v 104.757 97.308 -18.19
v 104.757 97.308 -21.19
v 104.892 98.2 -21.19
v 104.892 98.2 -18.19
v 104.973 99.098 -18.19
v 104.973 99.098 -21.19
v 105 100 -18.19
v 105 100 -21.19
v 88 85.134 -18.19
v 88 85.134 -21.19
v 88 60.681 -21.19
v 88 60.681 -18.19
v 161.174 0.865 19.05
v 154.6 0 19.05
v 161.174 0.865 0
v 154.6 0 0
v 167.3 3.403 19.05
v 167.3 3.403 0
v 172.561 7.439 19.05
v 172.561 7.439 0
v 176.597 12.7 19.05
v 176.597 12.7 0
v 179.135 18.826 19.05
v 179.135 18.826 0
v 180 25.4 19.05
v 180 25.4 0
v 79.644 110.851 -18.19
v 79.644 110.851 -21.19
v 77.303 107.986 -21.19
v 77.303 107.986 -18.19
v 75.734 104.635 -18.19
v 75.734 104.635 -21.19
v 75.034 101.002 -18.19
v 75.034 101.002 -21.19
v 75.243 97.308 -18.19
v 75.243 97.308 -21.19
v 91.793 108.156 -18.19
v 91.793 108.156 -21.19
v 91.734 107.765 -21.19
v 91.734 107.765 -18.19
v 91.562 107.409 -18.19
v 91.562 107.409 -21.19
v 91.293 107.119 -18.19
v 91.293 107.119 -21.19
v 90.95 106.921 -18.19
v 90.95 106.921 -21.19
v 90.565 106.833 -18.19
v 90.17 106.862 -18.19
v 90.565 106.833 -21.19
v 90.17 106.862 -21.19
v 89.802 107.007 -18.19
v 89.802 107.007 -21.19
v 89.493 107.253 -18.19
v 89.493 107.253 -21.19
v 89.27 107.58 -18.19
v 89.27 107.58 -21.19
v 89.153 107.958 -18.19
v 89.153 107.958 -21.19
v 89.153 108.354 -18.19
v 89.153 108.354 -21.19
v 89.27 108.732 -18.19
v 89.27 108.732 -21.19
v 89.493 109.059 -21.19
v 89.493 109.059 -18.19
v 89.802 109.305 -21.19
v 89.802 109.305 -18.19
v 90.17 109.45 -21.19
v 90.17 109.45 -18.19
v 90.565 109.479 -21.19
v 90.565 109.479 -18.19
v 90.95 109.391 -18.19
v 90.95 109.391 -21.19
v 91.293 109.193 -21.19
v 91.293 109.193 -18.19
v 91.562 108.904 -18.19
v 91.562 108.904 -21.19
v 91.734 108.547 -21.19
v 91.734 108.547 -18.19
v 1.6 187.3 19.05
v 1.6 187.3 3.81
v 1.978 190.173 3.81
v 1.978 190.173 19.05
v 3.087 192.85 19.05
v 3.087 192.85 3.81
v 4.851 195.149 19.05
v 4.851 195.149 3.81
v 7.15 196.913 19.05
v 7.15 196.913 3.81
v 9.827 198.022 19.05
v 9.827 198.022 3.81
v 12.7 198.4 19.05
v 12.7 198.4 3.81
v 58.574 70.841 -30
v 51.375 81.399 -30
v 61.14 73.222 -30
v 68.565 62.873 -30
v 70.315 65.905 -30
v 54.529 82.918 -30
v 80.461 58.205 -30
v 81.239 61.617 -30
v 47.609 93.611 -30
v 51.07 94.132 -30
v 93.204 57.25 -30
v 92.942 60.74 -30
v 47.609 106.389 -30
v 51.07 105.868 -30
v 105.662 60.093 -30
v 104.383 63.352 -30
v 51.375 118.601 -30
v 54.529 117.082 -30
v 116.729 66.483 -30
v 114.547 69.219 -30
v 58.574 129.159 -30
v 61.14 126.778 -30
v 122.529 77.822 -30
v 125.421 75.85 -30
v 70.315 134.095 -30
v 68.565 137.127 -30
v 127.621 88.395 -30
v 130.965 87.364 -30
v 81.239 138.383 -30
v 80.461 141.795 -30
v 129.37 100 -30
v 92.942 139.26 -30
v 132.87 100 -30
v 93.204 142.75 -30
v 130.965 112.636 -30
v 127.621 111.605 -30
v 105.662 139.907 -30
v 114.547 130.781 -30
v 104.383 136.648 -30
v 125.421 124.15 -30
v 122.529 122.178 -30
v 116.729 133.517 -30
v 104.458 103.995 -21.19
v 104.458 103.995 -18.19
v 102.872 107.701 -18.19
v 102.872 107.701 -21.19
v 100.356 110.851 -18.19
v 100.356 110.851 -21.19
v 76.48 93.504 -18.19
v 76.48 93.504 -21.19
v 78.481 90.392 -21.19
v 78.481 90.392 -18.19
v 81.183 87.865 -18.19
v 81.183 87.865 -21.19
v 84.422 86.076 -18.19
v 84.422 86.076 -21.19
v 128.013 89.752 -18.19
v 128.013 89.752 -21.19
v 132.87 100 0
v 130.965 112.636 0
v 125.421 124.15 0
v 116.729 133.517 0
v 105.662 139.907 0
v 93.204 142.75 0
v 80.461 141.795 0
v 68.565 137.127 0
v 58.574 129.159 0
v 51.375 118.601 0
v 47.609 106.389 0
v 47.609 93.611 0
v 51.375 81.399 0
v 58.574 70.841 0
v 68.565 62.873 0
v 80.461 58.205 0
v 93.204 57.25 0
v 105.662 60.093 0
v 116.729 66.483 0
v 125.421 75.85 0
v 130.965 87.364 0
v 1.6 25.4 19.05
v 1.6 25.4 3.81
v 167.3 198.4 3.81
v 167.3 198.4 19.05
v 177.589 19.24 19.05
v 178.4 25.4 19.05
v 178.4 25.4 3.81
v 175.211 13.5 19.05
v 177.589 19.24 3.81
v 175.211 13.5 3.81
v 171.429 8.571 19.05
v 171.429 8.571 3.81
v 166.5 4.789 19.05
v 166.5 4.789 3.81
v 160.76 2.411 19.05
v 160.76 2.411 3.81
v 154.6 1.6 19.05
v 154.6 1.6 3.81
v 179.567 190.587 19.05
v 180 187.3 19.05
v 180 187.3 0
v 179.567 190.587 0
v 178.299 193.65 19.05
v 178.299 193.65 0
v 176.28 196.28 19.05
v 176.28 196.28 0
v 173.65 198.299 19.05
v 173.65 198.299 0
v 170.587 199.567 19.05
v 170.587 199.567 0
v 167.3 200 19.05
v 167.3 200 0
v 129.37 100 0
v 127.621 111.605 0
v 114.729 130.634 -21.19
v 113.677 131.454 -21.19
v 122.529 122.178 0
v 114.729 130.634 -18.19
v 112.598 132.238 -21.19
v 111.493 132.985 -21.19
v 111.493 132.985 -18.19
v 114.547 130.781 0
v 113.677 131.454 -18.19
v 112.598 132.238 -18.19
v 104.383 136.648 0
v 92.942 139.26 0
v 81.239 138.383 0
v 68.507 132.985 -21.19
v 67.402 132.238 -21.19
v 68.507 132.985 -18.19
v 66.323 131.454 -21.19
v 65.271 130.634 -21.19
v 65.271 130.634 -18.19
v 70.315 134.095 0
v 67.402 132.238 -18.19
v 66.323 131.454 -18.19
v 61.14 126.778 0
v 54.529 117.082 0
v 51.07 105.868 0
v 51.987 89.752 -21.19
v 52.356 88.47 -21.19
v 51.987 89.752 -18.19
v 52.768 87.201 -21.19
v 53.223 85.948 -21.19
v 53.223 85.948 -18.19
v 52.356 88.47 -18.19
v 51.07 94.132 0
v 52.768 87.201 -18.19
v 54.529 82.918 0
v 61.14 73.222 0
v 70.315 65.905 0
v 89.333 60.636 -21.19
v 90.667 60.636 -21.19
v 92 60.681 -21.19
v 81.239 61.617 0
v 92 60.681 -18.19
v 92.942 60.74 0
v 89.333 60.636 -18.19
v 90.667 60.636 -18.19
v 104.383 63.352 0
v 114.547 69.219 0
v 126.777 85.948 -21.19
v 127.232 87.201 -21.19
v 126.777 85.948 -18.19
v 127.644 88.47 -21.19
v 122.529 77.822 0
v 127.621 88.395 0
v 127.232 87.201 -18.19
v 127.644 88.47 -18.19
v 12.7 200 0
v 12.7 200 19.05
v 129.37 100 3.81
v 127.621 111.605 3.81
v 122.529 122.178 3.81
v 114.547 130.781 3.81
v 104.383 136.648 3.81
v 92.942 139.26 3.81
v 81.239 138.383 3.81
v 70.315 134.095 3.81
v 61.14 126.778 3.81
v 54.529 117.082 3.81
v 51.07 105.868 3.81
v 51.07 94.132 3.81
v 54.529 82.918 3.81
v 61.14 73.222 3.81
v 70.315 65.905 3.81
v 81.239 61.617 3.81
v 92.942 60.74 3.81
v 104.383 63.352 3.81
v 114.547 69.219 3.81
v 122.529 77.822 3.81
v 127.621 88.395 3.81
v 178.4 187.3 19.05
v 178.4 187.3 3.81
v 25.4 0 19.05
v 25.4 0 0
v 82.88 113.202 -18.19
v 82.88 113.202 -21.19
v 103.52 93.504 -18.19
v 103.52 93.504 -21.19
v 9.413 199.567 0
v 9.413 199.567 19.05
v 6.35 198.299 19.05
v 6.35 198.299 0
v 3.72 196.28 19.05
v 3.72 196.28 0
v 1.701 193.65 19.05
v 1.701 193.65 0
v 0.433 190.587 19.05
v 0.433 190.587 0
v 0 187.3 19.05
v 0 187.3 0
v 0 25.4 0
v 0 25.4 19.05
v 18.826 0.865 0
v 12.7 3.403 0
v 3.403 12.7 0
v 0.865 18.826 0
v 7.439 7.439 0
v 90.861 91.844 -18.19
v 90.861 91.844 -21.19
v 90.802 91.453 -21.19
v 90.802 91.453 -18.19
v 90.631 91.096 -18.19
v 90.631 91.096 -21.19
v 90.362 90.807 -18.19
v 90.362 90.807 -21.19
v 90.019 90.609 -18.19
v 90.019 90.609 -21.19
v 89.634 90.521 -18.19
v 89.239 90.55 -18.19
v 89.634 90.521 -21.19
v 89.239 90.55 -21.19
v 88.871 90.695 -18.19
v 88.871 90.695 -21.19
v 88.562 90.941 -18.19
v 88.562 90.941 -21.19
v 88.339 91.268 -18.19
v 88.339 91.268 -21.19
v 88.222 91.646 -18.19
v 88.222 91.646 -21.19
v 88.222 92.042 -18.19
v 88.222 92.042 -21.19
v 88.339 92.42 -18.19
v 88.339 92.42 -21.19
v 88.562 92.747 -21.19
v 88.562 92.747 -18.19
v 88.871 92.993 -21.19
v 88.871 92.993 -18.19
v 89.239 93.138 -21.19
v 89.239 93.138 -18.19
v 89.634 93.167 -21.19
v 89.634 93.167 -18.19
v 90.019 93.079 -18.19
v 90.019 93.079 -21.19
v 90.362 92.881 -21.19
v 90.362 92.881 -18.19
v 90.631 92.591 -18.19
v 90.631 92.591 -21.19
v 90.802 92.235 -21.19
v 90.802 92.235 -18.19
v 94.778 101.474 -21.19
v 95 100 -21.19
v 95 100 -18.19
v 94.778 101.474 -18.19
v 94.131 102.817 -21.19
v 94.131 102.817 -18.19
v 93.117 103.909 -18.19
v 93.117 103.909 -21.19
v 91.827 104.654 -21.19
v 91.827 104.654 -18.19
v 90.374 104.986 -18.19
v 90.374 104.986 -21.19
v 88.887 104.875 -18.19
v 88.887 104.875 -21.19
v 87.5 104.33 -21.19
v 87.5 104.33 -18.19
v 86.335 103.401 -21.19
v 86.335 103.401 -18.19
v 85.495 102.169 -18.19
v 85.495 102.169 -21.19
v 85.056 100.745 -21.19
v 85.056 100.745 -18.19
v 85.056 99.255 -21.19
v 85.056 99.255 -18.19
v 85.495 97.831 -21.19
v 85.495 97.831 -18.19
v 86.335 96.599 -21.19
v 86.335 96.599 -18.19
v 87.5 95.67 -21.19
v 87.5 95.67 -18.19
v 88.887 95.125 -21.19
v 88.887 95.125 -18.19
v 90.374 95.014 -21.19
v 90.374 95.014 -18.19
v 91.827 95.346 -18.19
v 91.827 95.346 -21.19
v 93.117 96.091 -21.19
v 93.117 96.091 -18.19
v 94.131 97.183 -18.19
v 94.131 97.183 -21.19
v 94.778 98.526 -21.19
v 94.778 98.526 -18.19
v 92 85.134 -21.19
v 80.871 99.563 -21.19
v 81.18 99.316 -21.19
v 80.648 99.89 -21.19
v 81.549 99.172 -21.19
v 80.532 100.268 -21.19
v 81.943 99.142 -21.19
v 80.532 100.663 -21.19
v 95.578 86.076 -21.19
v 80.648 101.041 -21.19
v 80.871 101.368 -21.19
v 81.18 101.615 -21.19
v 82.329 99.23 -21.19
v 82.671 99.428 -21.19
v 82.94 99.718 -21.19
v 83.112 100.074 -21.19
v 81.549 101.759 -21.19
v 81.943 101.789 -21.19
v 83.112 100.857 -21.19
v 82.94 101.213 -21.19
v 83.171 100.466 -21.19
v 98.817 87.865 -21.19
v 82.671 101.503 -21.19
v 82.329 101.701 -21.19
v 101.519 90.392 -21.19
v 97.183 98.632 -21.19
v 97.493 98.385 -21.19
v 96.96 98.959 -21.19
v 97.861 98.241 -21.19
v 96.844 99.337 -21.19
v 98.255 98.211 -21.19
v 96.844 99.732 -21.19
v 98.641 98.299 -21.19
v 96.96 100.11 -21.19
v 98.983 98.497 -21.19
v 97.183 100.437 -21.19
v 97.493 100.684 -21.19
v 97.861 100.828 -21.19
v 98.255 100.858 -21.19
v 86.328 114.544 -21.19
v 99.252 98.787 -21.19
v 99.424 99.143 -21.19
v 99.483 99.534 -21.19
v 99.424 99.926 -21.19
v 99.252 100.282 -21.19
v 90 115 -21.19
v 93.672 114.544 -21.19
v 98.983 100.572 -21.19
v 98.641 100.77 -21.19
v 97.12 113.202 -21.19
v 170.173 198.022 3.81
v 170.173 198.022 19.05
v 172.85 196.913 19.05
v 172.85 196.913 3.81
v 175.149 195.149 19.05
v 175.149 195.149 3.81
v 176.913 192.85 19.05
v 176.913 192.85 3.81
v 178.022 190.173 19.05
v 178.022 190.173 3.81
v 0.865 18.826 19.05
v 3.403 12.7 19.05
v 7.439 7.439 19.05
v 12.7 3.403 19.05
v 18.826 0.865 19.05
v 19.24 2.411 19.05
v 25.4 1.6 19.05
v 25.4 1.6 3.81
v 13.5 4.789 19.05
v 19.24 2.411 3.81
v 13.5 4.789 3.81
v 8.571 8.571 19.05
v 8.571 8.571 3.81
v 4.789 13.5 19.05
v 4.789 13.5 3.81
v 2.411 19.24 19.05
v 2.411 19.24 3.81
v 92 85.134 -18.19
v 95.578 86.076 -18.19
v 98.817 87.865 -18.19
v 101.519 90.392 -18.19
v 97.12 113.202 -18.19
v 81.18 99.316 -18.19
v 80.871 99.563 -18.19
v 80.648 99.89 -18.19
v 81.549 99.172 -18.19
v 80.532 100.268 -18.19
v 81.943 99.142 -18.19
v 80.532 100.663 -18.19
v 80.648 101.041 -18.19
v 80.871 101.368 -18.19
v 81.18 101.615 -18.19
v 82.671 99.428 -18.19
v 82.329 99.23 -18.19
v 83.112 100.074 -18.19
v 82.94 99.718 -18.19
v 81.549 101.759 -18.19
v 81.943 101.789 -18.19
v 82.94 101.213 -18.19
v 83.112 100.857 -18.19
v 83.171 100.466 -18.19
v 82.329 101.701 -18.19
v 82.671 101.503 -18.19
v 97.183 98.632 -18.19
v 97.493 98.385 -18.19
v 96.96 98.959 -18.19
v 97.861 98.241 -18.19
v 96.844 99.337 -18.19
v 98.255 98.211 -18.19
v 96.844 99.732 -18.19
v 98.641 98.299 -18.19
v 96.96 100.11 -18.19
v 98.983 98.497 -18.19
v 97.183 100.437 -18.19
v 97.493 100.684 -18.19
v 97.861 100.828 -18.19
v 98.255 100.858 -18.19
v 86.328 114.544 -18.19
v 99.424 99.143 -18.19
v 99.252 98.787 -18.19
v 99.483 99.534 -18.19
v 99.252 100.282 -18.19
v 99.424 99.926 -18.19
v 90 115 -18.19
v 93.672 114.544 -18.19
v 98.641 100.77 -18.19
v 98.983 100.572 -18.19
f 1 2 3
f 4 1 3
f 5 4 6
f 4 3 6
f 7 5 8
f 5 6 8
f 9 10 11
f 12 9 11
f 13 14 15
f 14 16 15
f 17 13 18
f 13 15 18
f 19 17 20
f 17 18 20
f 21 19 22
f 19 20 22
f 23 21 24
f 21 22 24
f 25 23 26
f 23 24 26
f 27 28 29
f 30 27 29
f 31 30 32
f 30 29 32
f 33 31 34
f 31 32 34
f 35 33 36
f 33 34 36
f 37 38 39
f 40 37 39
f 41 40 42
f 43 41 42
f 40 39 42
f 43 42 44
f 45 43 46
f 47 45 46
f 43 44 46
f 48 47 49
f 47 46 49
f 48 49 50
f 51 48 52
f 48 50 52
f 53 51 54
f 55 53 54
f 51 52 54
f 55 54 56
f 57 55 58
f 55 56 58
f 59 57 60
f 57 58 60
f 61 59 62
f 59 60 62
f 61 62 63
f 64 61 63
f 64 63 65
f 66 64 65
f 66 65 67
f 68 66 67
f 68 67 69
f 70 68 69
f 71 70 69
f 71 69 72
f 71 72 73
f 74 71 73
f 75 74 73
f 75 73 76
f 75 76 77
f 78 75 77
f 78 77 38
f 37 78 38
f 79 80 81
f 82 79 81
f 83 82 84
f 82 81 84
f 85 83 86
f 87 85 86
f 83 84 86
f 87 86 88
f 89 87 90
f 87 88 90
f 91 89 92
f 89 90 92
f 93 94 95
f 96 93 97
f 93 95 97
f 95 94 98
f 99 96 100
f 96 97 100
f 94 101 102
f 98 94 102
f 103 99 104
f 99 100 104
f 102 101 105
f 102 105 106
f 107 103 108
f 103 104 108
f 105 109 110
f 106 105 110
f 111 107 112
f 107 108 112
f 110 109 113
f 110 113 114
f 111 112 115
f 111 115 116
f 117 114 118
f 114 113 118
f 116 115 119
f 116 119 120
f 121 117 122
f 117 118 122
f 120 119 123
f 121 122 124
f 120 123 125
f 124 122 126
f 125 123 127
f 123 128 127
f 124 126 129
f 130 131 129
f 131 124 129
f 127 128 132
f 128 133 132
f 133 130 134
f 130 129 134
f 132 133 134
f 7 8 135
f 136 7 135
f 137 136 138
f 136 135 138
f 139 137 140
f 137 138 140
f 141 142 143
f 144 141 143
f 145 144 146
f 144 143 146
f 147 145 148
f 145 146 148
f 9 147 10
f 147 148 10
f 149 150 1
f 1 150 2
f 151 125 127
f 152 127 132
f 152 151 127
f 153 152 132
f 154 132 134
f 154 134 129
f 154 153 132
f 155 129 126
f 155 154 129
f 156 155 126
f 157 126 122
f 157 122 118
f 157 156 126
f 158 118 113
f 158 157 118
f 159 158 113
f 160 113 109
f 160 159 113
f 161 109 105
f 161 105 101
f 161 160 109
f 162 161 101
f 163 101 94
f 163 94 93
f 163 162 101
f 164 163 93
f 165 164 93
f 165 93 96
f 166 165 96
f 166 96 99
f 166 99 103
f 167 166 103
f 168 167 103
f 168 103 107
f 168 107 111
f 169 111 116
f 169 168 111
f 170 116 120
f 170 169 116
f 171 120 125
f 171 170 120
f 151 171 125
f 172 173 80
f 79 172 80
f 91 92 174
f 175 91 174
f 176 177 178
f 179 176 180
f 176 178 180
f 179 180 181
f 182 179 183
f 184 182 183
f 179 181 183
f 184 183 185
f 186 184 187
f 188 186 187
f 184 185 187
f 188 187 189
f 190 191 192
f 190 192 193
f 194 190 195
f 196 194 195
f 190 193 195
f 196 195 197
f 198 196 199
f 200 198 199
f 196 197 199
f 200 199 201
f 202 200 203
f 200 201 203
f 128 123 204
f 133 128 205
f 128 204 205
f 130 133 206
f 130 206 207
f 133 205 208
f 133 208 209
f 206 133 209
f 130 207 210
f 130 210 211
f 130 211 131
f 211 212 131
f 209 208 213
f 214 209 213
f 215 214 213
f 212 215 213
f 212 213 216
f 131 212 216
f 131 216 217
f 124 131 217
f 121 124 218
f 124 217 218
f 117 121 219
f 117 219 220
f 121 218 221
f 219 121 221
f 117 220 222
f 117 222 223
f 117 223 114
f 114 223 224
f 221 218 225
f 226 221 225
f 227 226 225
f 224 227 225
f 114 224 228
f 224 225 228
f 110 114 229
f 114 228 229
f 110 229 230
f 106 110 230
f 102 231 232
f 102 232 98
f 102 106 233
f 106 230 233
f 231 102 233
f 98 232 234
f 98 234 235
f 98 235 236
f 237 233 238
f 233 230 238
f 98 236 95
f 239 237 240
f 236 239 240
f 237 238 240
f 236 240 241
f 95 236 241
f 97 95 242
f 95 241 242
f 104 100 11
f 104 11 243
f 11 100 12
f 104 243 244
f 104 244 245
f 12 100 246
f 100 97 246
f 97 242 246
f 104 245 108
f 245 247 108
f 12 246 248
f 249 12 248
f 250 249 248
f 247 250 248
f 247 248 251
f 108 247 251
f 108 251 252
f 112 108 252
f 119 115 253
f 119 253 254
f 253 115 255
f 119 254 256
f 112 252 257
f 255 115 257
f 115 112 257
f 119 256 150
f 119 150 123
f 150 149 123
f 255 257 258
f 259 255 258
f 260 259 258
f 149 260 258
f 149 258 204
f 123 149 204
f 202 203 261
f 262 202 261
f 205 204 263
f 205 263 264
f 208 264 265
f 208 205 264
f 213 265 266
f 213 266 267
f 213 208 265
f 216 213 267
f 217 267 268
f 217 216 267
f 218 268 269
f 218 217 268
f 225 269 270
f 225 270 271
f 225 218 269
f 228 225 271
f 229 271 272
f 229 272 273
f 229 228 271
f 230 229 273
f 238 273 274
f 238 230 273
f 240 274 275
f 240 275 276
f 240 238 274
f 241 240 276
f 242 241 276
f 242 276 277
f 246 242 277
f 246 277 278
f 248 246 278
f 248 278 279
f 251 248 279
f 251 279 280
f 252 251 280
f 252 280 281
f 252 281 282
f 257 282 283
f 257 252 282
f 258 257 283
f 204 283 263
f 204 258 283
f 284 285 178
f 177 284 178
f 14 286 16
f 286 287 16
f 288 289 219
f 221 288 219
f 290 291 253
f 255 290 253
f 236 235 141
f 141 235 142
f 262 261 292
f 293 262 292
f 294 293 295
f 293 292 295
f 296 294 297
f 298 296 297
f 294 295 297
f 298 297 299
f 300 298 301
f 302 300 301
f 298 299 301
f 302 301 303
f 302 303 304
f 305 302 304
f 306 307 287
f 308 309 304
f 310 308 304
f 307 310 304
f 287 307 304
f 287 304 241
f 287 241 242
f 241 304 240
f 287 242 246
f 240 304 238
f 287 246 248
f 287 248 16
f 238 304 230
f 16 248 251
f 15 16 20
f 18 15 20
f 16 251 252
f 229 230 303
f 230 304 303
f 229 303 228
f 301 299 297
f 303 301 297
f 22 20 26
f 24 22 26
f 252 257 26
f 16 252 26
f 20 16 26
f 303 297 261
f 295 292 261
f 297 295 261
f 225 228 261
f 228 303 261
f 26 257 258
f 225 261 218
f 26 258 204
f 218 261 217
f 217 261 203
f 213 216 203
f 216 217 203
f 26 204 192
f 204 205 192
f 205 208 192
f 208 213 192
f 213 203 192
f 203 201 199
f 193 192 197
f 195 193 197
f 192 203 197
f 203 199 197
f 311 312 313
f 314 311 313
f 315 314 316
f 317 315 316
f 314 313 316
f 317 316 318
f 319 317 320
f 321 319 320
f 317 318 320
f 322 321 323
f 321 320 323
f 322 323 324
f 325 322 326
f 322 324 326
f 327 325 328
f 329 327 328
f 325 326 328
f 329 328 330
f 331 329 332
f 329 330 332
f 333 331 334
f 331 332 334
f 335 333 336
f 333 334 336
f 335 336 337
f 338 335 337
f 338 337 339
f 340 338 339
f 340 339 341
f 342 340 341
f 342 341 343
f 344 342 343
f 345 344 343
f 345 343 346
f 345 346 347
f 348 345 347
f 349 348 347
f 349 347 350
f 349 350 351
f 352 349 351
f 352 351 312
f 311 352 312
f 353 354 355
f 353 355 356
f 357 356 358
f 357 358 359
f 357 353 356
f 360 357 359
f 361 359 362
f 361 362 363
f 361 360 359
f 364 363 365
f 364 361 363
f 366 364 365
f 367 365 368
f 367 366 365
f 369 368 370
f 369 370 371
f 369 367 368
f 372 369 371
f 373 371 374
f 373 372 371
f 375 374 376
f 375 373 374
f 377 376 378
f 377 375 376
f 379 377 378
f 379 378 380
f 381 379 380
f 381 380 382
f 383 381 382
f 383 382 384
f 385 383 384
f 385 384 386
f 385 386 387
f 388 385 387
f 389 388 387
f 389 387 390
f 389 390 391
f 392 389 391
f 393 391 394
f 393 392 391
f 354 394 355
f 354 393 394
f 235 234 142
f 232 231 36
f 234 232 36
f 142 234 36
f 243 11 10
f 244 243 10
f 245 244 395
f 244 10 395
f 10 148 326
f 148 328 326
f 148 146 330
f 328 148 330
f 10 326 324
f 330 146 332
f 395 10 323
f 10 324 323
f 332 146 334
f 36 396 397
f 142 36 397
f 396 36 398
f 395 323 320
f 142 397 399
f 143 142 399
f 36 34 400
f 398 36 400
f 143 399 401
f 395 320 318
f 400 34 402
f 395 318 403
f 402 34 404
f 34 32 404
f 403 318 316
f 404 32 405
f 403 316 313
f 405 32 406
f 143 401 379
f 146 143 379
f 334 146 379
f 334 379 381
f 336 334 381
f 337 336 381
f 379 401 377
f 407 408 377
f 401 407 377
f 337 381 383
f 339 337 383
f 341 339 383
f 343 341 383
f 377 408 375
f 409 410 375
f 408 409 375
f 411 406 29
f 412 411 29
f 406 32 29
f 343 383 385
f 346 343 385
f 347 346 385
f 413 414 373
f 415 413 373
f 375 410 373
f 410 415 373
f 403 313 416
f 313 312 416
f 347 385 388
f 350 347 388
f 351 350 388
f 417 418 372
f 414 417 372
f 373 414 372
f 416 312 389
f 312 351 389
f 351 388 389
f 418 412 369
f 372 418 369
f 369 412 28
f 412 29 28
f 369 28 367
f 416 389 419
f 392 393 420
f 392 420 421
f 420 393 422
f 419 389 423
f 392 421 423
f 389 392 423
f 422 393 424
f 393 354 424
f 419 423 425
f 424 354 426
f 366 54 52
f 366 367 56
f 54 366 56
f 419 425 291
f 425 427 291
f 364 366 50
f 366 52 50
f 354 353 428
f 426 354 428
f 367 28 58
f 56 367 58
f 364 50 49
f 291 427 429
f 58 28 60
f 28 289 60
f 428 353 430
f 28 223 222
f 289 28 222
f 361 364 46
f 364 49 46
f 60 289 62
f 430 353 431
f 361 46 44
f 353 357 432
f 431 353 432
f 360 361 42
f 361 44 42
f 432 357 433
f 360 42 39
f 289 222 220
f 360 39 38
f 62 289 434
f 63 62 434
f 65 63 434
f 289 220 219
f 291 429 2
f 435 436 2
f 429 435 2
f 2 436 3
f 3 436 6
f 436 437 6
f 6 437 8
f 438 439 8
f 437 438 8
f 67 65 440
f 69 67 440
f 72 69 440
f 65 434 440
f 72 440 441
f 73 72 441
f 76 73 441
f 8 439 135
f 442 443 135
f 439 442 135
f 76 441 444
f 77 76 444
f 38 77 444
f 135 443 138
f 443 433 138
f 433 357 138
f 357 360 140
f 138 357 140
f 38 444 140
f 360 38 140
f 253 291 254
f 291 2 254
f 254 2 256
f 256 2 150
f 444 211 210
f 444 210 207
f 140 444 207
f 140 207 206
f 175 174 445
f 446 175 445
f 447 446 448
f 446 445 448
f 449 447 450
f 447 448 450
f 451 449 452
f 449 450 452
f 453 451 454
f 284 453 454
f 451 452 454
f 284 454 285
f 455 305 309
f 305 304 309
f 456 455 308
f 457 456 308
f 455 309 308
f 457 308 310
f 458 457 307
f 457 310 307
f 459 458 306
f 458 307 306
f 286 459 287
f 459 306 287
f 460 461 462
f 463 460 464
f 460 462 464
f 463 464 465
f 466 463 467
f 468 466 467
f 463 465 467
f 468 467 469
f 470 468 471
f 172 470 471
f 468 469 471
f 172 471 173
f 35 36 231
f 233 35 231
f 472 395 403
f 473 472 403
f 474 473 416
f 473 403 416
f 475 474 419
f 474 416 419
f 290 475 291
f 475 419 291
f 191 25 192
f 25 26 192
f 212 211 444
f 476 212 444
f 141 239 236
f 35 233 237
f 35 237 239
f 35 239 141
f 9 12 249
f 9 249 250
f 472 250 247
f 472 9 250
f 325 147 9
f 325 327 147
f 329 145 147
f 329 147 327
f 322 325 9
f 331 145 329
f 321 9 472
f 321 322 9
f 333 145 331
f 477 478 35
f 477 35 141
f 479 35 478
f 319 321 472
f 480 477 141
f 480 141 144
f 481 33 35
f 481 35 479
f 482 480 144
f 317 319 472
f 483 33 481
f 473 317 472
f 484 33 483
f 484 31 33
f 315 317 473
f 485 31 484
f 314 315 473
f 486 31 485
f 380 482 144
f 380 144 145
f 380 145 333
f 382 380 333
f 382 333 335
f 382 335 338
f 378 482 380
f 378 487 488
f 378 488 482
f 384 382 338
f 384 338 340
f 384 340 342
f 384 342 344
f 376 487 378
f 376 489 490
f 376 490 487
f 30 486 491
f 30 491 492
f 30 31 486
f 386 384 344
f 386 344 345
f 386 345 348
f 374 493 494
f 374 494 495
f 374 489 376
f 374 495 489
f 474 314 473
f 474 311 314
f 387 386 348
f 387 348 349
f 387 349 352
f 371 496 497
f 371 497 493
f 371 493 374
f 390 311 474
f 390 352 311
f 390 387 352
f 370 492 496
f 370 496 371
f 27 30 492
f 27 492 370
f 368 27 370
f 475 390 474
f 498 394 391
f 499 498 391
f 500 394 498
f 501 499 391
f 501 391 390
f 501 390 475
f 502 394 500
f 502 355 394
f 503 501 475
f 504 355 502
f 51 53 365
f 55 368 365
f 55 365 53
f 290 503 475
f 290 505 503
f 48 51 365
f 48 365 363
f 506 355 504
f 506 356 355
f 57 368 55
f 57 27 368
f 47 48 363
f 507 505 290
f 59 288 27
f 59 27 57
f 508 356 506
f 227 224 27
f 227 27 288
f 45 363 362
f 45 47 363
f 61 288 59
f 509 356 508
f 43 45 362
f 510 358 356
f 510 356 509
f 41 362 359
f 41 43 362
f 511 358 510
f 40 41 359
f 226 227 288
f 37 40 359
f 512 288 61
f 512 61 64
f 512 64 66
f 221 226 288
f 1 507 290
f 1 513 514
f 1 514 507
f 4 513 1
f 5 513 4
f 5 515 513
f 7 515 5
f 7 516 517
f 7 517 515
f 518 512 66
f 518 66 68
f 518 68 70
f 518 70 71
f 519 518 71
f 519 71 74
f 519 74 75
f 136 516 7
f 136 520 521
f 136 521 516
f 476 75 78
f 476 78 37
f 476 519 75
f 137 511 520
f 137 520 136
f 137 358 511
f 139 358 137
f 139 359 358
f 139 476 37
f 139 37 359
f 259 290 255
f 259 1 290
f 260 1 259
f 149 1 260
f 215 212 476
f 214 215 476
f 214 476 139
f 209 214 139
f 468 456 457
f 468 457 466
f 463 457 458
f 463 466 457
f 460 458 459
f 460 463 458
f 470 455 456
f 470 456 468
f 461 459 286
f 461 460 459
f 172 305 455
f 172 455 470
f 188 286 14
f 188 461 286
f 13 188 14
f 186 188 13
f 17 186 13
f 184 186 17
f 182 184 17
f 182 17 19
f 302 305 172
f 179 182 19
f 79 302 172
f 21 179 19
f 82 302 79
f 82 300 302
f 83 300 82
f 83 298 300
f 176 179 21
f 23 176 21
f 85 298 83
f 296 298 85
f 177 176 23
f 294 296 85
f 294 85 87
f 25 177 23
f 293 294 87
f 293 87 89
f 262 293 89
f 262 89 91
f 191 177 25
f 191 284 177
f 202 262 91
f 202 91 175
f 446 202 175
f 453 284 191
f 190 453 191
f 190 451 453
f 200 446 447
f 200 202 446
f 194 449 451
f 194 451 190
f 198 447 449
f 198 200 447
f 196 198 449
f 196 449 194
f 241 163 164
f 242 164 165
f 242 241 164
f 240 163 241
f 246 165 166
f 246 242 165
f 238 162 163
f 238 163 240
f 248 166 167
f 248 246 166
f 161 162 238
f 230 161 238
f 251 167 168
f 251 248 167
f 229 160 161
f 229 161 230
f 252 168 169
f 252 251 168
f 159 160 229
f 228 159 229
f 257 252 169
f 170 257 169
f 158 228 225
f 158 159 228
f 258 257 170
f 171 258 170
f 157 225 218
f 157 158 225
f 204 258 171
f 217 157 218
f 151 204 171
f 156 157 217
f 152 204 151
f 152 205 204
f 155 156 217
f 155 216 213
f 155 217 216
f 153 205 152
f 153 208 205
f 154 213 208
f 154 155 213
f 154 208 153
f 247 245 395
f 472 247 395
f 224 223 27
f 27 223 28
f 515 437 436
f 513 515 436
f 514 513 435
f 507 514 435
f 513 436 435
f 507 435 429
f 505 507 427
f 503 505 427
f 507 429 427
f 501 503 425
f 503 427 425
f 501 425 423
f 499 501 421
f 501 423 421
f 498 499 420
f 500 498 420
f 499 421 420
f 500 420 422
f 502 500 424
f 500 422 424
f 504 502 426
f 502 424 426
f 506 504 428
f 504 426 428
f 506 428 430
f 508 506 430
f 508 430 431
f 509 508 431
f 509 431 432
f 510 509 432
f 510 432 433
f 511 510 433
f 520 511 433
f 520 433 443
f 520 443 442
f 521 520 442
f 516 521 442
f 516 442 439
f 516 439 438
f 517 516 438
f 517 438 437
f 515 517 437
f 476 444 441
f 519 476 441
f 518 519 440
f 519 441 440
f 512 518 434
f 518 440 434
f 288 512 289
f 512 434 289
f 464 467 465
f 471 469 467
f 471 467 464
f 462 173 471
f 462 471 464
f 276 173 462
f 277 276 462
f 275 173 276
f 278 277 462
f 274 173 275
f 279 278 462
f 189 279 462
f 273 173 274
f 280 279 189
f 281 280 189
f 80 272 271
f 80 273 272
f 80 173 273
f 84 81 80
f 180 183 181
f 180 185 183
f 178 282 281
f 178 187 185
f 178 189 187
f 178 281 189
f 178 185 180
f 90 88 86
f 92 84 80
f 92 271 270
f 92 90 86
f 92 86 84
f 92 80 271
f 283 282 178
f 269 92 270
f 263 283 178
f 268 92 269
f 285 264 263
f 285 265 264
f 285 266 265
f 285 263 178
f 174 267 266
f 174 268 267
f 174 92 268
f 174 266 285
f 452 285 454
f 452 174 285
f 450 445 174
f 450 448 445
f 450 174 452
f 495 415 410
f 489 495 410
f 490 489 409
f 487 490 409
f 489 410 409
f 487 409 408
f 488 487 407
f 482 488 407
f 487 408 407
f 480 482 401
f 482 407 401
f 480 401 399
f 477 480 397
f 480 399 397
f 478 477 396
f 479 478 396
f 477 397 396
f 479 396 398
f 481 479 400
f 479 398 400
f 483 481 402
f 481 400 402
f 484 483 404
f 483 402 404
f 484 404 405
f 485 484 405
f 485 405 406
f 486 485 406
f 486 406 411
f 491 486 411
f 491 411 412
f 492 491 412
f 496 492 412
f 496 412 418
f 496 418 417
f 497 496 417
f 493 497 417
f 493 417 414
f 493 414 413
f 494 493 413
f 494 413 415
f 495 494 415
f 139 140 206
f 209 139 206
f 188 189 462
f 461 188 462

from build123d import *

# Parameters (mm, degrees)
F0_R      = 39.37
F1_DEPTH  = 3.81
F3_DEPTH  = 15.24
F4_R      = 42.87
F4_R_2    = 39.37
F5_DEPTH  = 30
F7_R      = 5
F8_DEPTH  = 3
F9_R      = 1.3269668218
F10_DEPTH = 25


with BuildPart() as f1:
    # F0 (on Top) → F1 (new body)
    with BuildSketch(Plane.XY):
        with BuildLine():
            ThreePointArc((0, 25.4), (7.4394877579, 7.4394877579), (25.4, 0))
            Line((25.4, 0), (154.6, 0))
            ThreePointArc((154.6, 0), (172.5605122421, 7.4394877579), (180, 25.4))
            Line((180, 25.4), (180, 187.3))
            ThreePointArc((180, 187.3), (176.2802561211, 196.2802561211), (167.3, 200))
            Line((167.3, 200), (12.7, 200))
            ThreePointArc((12.7, 200), (3.7197438789, 196.2802561211), (0, 187.3))
            Line((0, 187.3), (0, 25.4))
        make_face()
        with Locations((90, 100)):
            Circle(F0_R, mode=Mode.SUBTRACT)
    extrude(amount=F1_DEPTH)

    # F2 (on face) → F3 (join)
    with BuildSketch(Plane.XY.offset(3.81)):
        with BuildLine():
            Line((0, 187.3), (0, 25.4))
            ThreePointArc((0, 25.4), (7.4394877579, 7.4394877579), (25.4, 0))
            Line((25.4, 0), (154.6, 0))
            ThreePointArc((154.6, 0), (172.5605122421, 7.4394877579), (180, 25.4))
            Line((180, 25.4), (180, 187.3))
            ThreePointArc((180, 187.3), (176.2802561211, 196.2802561211), (167.3, 200))
            Line((167.3, 200), (12.7, 200))
            ThreePointArc((12.7, 200), (3.7197438789, 196.2802561211), (0, 187.3))
        make_face()
        with BuildLine():
            ThreePointArc((178.4, 25.4), (171.4291413922, 8.5708586078), (154.6, 1.6))
            Line((154.6, 1.6), (25.4, 1.6))
            ThreePointArc((25.4, 1.6), (8.5708586078, 8.5708586078), (1.6, 25.4))
            Line((1.6, 25.4), (1.6, 187.3))
            ThreePointArc((1.6, 187.3), (4.8511147288, 195.1488852712), (12.7, 198.4))
            Line((12.7, 198.4), (167.3, 198.4))
            ThreePointArc((167.3, 198.4), (175.1488852712, 195.1488852712), (178.4, 187.3))
            Line((178.4, 187.3), (178.4, 25.4))
        make_face(mode=Mode.SUBTRACT)
    extrude(amount=F3_DEPTH)


with BuildPart() as f5:
    # F4 (on Top) → F5 (new body)
    with BuildSketch(Plane.XY):
        with Locations((90, 100)):
            Circle(F4_R)
        with Locations((90, 100)):
            Circle(F4_R_2, mode=Mode.SUBTRACT)
    extrude(amount=-F5_DEPTH)

    # F7 (on offset) → F8 (join)
    with BuildSketch(Plane.XY.offset(-21.19)):
        with BuildLine():
            ThreePointArc((104.7565055426, 97.3082451501), (104.9390023619, 98.6486272052), (105, 100))
            ThreePointArc((105, 100), (103.7902383839, 105.9016375113), (100.356089958, 110.8513317515))
            Line((100.356089958, 110.8513317515), (99.67855692, 109.9187875275))
            Line((99.67855692, 109.9187875275), (96.5325938917, 112.3939473597))
            Line((96.5325938917, 112.3939473597), (97.1200219805, 113.2024727607))
            ThreePointArc((97.1200219805, 113.2024727607), (90, 115), (82.8799780195, 113.2024727607))
            Line((82.8799780195, 113.2024727607), (83.5575110575, 112.2699285367))
            Line((83.5575110575, 112.2699285367), (80.2313381308, 110.0428063506))
            Line((80.2313381308, 110.0428063506), (79.643910042, 110.8513317515))
            ThreePointArc((79.643910042, 110.8513317515), (75.7341522556, 104.6352549156), (75.2434944574, 97.3082451501))
            Line((75.2434944574, 97.3082451501), (76.3397659414, 97.6644453477))
            Line((76.3397659414, 97.6644453477), (77.4300410485, 93.8128483073))
            Line((77.4300410485, 93.8128483073), (76.4795624349, 93.5040190849))
            ThreePointArc((76.4795624349, 93.5040190849), (81.1832212156, 87.8647450844), (88, 85.1339312527))
            Line((88, 85.1339312527), (88, 86.2866193056))
            Line((88, 86.2866193056), (92, 86.1333236098))
            Line((92, 86.1333236098), (92, 85.1339312527))
            ThreePointArc((92, 85.1339312527), (98.8167787844, 87.8647450844), (103.5204375651, 93.5040190849))
            Line((103.5204375651, 93.5040190849), (102.4241660811, 93.8602192825))
            Line((102.4241660811, 93.8602192825), (103.806026929, 97.6170743725))
            Line((103.806026929, 97.6170743725), (104.7565055426, 97.3082451501))
        make_face()
        with Locations((90, 100)):
            Circle(F7_R, mode=Mode.SUBTRACT)
        with BuildLine():
            Line((92, 60.5456195772), (92, 85.1339312527))
            ThreePointArc((92, 85.1339312527), (90, 85), (88, 85.1339312527))
            Line((88, 85.1339312527), (88, 60.5456195772))
            Line((88, 60.5456195772), (92, 60.5456195772))
        make_face()
        with BuildLine():
            ThreePointArc((76.4795624349, 93.5040190849), (75.7341522556, 95.3647450844), (75.2434944574, 97.3082451501))
            Line((75.2434944574, 97.3082451501), (51.8586204137, 89.7100389794))
            Line((51.8586204137, 89.7100389794), (53.0946883912, 85.9058129142))
            Line((53.0946883912, 85.9058129142), (76.4795624349, 93.5040190849))
        make_face()
        with BuildLine():
            ThreePointArc((79.643910042, 110.8513317515), (81.1832212156, 112.1352549156), (82.8799780195, 113.2024727607))
            Line((82.8799780195, 113.2024727607), (68.4273310379, 133.0948347692))
            Line((68.4273310379, 133.0948347692), (65.1912630604, 130.74369376))
            Line((65.1912630604, 130.74369376), (79.643910042, 110.8513317515))
        make_face()
        with BuildLine():
            ThreePointArc((97.1200219805, 113.2024727607), (98.8167787844, 112.1352549156), (100.356089958, 110.8513317515))
            Line((100.356089958, 110.8513317515), (114.8087369396, 130.74369376))
            Line((114.8087369396, 130.74369376), (111.5726689621, 133.0948347692))
            Line((111.5726689621, 133.0948347692), (97.1200219805, 113.2024727607))
        make_face()
        with BuildLine():
            Line((128.1413795863, 89.7100389794), (104.7565055426, 97.3082451501))
            ThreePointArc((104.7565055426, 97.3082451501), (104.2658477444, 95.3647450844), (103.5204375651, 93.5040190849))
            Line((103.5204375651, 93.5040190849), (126.9053116088, 85.9058129142))
            Line((126.9053116088, 85.9058129142), (128.1413795863, 89.7100389794))
        make_face()
        with BuildLine():
            ThreePointArc((103.5204375651, 93.5040190849), (104.2658477444, 95.3647450844), (104.7565055426, 97.3082451501))
            Line((104.7565055426, 97.3082451501), (103.806026929, 97.6170743725))
            Line((103.806026929, 97.6170743725), (102.4241660811, 93.8602192825))
            Line((102.4241660811, 93.8602192825), (103.5204375651, 93.5040190849))
        make_face()
        with BuildLine():
            ThreePointArc((88, 85.1339312527), (90, 85), (92, 85.1339312527))
            Line((92, 85.1339312527), (92, 86.1333236098))
            Line((92, 86.1333236098), (88, 86.2866193056))
            Line((88, 86.2866193056), (88, 85.1339312527))
        make_face()
        with BuildLine():
            Line((76.3397659414, 97.6644453477), (75.2434944574, 97.3082451501))
            ThreePointArc((75.2434944574, 97.3082451501), (75.7341522556, 95.3647450844), (76.4795624349, 93.5040190849))
            Line((76.4795624349, 93.5040190849), (77.4300410485, 93.8128483073))
            Line((77.4300410485, 93.8128483073), (76.3397659414, 97.6644453477))
        make_face()
        with BuildLine():
            Line((83.5575110575, 112.2699285367), (82.8799780195, 113.2024727607))
            ThreePointArc((82.8799780195, 113.2024727607), (81.1832212156, 112.1352549156), (79.643910042, 110.8513317515))
            Line((79.643910042, 110.8513317515), (80.2313381308, 110.0428063506))
            Line((80.2313381308, 110.0428063506), (83.5575110575, 112.2699285367))
        make_face()
        with BuildLine():
            Line((99.67855692, 109.9187875275), (100.356089958, 110.8513317515))
            ThreePointArc((100.356089958, 110.8513317515), (98.8167787844, 112.1352549156), (97.1200219805, 113.2024727607))
            Line((97.1200219805, 113.2024727607), (96.5325938917, 112.3939473597))
            Line((96.5325938917, 112.3939473597), (99.67855692, 109.9187875275))
        make_face()
    extrude(amount=F8_DEPTH)

    # F9 (on face) → F10 (cut)
    with BuildSketch(Plane(origin=(0, 0, -21.19), x_dir=(1, 0, 0), z_dir=(0, 0, -1))):
        with Locations((90.4655754566, -108.1560328603)):
            Circle(F9_R)
        with Locations((98.1560328603, -99.5344245434)):
            Circle(F9_R)
        with Locations((89.5344245434, -91.8439671397)):
            Circle(F9_R)
        with Locations((81.8439671397, -100.4655754566)):
            Circle(F9_R)
    extrude(amount=-F10_DEPTH, mode=Mode.SUBTRACT)


solid = Compound([f1.part, f5.part])
